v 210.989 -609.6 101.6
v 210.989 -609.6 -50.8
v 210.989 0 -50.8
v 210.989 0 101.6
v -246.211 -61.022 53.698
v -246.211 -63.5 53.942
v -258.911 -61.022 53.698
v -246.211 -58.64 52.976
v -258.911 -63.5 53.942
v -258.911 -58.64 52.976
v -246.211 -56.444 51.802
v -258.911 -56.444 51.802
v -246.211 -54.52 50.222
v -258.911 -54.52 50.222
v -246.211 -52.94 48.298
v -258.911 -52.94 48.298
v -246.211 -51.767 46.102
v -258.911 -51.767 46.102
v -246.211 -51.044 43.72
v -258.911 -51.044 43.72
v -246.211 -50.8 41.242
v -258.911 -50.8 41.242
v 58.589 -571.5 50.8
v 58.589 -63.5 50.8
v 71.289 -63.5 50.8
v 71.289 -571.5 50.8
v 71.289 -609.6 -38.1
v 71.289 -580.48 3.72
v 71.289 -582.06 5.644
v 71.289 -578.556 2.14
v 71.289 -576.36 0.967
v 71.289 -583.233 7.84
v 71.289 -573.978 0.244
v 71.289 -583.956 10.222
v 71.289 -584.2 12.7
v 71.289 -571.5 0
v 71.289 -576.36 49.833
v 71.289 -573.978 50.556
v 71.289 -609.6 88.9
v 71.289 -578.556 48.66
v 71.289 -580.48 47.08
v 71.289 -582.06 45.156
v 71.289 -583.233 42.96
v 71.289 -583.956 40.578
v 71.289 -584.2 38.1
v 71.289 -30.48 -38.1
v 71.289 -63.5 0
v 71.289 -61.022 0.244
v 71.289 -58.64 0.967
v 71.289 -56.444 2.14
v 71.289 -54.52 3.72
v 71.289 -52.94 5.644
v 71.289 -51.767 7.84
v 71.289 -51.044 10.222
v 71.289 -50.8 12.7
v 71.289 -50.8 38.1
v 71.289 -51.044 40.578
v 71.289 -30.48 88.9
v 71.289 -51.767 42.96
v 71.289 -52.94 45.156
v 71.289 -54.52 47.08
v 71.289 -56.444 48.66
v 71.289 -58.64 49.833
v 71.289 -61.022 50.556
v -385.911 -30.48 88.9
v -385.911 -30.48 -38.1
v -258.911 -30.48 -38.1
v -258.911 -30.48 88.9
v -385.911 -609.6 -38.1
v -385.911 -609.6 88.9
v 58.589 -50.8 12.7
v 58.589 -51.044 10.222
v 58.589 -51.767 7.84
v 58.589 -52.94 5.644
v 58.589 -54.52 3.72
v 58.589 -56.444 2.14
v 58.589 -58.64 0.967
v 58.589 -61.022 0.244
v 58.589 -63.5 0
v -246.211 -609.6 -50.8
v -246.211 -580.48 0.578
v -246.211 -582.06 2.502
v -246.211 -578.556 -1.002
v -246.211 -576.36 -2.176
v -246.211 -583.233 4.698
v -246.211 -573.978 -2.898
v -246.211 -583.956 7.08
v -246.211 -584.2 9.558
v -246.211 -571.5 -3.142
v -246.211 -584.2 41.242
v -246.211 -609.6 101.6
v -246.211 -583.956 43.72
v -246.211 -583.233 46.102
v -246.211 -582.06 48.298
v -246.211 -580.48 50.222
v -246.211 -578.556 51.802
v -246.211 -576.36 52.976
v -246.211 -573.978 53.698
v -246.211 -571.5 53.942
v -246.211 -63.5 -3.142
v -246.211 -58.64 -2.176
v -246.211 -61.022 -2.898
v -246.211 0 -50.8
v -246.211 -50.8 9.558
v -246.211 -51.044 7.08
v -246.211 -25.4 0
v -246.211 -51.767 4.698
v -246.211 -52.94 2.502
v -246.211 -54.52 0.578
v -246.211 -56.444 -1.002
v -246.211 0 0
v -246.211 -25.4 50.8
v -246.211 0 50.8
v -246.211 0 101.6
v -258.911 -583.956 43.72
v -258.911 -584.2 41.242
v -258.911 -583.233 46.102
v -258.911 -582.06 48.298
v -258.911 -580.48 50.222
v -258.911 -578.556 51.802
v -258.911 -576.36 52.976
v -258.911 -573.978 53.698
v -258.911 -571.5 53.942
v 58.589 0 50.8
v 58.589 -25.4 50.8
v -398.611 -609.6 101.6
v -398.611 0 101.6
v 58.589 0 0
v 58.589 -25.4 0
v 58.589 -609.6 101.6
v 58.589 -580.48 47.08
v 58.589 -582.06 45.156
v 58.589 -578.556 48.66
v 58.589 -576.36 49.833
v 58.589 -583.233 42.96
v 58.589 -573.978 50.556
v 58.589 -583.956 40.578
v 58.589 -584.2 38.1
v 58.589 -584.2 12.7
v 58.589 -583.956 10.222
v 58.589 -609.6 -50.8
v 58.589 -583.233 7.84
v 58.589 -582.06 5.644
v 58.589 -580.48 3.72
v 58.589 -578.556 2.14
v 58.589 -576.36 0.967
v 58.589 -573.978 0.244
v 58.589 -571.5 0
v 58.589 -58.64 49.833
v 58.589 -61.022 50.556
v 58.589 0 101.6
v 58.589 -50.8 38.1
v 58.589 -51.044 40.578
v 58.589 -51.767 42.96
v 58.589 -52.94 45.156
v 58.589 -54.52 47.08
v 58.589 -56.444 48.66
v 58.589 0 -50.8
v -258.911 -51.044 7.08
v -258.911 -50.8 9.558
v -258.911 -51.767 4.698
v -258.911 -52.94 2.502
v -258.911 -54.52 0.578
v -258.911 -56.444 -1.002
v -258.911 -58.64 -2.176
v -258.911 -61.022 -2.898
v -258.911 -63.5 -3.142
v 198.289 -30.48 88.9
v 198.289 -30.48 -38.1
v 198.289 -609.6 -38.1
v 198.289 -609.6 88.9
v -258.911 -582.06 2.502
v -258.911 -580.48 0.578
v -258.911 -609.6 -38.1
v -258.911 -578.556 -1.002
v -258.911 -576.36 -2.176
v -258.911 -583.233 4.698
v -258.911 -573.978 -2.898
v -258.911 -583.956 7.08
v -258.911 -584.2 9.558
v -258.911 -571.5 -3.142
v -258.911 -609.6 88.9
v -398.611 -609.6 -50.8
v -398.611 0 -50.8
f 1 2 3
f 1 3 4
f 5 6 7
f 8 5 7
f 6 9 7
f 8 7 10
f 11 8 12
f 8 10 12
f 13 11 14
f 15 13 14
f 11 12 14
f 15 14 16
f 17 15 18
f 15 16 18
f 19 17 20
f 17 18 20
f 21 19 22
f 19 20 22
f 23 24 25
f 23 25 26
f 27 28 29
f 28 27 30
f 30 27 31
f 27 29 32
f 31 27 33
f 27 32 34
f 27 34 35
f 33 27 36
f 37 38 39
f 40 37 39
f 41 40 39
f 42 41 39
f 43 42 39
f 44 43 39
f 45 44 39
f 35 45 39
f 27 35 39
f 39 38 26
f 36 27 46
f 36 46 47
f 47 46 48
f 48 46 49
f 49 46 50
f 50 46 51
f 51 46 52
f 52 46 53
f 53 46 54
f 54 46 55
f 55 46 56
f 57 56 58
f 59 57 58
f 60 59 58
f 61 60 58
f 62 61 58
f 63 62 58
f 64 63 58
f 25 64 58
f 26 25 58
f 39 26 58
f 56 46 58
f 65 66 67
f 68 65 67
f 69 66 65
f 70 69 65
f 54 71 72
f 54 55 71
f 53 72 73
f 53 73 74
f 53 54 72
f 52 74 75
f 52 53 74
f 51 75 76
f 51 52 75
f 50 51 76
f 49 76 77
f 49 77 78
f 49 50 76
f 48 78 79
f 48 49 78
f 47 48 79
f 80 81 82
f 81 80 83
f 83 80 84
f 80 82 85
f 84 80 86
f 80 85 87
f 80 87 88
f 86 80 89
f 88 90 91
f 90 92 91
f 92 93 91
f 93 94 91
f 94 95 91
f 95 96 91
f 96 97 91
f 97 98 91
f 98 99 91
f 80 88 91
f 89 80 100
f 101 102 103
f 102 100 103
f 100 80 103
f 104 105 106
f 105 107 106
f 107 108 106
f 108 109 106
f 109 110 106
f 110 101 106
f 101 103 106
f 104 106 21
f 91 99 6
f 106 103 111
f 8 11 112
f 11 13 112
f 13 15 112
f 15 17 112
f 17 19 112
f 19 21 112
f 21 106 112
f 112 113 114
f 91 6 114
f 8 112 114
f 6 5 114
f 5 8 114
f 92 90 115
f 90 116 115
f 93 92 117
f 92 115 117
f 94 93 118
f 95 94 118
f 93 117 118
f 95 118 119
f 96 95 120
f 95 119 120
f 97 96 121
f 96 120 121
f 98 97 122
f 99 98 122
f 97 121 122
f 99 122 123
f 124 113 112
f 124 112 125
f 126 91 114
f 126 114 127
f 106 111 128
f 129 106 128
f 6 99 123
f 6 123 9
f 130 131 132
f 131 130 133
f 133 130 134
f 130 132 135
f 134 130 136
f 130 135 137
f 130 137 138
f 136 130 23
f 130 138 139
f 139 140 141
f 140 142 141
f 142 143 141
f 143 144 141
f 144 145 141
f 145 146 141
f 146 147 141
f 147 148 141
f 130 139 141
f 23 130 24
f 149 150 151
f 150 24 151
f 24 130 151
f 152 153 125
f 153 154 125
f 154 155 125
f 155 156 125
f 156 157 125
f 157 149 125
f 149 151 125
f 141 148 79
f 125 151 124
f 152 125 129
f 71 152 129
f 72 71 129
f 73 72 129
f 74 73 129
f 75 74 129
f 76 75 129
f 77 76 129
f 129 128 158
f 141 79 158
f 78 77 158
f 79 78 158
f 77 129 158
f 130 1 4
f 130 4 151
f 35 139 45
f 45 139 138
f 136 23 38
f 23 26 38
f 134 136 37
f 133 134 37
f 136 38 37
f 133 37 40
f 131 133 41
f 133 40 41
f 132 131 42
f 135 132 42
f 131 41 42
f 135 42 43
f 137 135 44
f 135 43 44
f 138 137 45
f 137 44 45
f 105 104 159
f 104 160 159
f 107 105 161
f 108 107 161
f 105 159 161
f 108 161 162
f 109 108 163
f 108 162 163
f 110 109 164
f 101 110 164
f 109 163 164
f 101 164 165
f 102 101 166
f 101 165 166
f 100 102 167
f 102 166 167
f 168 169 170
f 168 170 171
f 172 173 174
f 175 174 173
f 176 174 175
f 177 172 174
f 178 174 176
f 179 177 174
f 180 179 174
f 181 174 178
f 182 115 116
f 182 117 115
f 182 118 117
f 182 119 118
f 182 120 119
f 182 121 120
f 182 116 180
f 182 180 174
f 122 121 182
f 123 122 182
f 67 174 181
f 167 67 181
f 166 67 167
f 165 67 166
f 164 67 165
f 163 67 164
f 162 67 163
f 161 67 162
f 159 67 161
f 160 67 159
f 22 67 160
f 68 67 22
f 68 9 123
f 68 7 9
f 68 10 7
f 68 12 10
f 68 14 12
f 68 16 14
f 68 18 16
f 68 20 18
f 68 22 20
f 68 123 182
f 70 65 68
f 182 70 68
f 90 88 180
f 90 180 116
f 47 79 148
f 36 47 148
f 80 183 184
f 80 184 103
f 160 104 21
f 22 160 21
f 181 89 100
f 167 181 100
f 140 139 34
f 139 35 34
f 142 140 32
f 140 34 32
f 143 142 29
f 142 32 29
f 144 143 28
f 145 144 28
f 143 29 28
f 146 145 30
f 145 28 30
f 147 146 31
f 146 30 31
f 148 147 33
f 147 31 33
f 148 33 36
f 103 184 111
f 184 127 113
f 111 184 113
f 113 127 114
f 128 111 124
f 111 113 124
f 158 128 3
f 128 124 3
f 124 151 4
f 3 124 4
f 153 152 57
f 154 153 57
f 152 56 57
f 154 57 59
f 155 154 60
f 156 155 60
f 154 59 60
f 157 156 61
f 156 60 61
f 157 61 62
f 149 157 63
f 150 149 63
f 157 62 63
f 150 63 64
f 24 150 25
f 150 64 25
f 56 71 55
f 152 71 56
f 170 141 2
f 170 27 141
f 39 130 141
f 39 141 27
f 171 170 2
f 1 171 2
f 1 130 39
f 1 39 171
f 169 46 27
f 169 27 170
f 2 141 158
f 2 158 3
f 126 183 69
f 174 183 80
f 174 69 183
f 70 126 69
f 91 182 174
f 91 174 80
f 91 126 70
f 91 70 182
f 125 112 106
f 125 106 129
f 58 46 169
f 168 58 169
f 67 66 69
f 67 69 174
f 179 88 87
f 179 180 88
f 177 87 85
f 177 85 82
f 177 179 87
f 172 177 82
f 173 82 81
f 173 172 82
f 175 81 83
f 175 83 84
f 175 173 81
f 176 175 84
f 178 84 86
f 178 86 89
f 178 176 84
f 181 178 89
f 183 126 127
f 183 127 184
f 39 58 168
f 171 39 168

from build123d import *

# Parameters (mm, degrees)
F0_W     = 127
F0_H     = 127
F0_W_2   = 304.8
F0_H_2   = 50.8
F1_DEPTH = 25.4
F2_DEPTH = 30.48
F3_DEPTH = 609.6
F4_W     = 533.4
F4_H     = 57.0844708983
F5_DEPTH = 25.4
F6_R     = 12.7
F7_W     = 533.4
F7_H     = 50.8
F8_DEPTH = 25.4
F9_R     = 12.7


with BuildPart() as f1:
    # F0 (on Front) → F1 (new body)
    with BuildSketch(Plane.XZ):
        Polygon((-398.611273554, 101.6), (-398.611273554, -50.8), (-246.211273554, -50.8), (-246.211273554, 0), (-246.211273554, 50.8), (-246.211273554, 101.6), align=None)
        with Locations((-322.411273554, 25.4)):
            Rectangle(F0_W, F0_H, mode=Mode.SUBTRACT)
        with Locations((-93.811273554, 25.4)):
            Rectangle(F0_W_2, F0_H_2)
        Polygon((58.588726446, 50.8), (58.588726446, 0), (58.588726446, -50.8), (210.988726446, -50.8), (210.988726446, 101.6), (58.588726446, 101.6), align=None)
        with Locations((134.788726446, 25.4)):
            Rectangle(F0_W, F0_H, mode=Mode.SUBTRACT)
    extrude(amount=F1_DEPTH)

    # F0 (on Front) → F2 (join)
    with BuildSketch(Plane.XZ):
        with Locations((-322.411273554, 25.4)):
            Rectangle(F0_W, F0_H)
        with Locations((134.788726446, 25.4)):
            Rectangle(F0_W, F0_H)
    extrude(amount=F2_DEPTH)

    # F0 (on Front) → F3 (join)
    with BuildSketch(Plane.XZ):
        Polygon((-398.611273554, 101.6), (-398.611273554, -50.8), (-246.211273554, -50.8), (-246.211273554, 0), (-246.211273554, 50.8), (-246.211273554, 101.6), align=None)
        with Locations((-322.411273554, 25.4)):
            Rectangle(F0_W, F0_H, mode=Mode.SUBTRACT)
        Polygon((58.588726446, 50.8), (58.588726446, 0), (58.588726446, -50.8), (210.988726446, -50.8), (210.988726446, 101.6), (58.588726446, 101.6), align=None)
        with Locations((134.788726446, 25.4)):
            Rectangle(F0_W, F0_H, mode=Mode.SUBTRACT)
    extrude(amount=F3_DEPTH)

    # F4 (on face) → F5 (cut)
    with BuildSketch(Plane.YZ.offset(-246.211273554)):
        with Locations((-317.5, 25.4)):
            Rectangle(F4_W, F4_H)
    extrude(amount=-F5_DEPTH, mode=Mode.SUBTRACT)

    # F6
    f6_edges = [f1.edges().sort_by_distance(p)[0] for p in [
        (-252.561274, -584.2, -3.142235),
        (-252.561274, -584.2, 53.942235),
        (-252.561274, -50.8, 53.942235),
        (-252.561274, -50.8, -3.142235),
    ]]
    fillet(f6_edges, radius=F6_R)

    # F7 (on face) → F8 (cut)
    with BuildSketch(Plane(origin=(58.588726446, 0, 0), x_dir=(0, -1, 0), z_dir=(-1, 0, 0))):
        with Locations((317.5, 25.4)):
            Rectangle(F7_W, F7_H)
    extrude(amount=-F8_DEPTH, mode=Mode.SUBTRACT)

    # F9
    f9_edges = [f1.edges().sort_by_distance(p)[0] for p in [
        (64.938726, -584.2, 50.8),
        (64.938726, -584.2, 0),
        (64.938726, -50.8, 0),
        (64.938726, -50.8, 50.8),
    ]]
    fillet(f9_edges, radius=F9_R)


solid = f1.part
